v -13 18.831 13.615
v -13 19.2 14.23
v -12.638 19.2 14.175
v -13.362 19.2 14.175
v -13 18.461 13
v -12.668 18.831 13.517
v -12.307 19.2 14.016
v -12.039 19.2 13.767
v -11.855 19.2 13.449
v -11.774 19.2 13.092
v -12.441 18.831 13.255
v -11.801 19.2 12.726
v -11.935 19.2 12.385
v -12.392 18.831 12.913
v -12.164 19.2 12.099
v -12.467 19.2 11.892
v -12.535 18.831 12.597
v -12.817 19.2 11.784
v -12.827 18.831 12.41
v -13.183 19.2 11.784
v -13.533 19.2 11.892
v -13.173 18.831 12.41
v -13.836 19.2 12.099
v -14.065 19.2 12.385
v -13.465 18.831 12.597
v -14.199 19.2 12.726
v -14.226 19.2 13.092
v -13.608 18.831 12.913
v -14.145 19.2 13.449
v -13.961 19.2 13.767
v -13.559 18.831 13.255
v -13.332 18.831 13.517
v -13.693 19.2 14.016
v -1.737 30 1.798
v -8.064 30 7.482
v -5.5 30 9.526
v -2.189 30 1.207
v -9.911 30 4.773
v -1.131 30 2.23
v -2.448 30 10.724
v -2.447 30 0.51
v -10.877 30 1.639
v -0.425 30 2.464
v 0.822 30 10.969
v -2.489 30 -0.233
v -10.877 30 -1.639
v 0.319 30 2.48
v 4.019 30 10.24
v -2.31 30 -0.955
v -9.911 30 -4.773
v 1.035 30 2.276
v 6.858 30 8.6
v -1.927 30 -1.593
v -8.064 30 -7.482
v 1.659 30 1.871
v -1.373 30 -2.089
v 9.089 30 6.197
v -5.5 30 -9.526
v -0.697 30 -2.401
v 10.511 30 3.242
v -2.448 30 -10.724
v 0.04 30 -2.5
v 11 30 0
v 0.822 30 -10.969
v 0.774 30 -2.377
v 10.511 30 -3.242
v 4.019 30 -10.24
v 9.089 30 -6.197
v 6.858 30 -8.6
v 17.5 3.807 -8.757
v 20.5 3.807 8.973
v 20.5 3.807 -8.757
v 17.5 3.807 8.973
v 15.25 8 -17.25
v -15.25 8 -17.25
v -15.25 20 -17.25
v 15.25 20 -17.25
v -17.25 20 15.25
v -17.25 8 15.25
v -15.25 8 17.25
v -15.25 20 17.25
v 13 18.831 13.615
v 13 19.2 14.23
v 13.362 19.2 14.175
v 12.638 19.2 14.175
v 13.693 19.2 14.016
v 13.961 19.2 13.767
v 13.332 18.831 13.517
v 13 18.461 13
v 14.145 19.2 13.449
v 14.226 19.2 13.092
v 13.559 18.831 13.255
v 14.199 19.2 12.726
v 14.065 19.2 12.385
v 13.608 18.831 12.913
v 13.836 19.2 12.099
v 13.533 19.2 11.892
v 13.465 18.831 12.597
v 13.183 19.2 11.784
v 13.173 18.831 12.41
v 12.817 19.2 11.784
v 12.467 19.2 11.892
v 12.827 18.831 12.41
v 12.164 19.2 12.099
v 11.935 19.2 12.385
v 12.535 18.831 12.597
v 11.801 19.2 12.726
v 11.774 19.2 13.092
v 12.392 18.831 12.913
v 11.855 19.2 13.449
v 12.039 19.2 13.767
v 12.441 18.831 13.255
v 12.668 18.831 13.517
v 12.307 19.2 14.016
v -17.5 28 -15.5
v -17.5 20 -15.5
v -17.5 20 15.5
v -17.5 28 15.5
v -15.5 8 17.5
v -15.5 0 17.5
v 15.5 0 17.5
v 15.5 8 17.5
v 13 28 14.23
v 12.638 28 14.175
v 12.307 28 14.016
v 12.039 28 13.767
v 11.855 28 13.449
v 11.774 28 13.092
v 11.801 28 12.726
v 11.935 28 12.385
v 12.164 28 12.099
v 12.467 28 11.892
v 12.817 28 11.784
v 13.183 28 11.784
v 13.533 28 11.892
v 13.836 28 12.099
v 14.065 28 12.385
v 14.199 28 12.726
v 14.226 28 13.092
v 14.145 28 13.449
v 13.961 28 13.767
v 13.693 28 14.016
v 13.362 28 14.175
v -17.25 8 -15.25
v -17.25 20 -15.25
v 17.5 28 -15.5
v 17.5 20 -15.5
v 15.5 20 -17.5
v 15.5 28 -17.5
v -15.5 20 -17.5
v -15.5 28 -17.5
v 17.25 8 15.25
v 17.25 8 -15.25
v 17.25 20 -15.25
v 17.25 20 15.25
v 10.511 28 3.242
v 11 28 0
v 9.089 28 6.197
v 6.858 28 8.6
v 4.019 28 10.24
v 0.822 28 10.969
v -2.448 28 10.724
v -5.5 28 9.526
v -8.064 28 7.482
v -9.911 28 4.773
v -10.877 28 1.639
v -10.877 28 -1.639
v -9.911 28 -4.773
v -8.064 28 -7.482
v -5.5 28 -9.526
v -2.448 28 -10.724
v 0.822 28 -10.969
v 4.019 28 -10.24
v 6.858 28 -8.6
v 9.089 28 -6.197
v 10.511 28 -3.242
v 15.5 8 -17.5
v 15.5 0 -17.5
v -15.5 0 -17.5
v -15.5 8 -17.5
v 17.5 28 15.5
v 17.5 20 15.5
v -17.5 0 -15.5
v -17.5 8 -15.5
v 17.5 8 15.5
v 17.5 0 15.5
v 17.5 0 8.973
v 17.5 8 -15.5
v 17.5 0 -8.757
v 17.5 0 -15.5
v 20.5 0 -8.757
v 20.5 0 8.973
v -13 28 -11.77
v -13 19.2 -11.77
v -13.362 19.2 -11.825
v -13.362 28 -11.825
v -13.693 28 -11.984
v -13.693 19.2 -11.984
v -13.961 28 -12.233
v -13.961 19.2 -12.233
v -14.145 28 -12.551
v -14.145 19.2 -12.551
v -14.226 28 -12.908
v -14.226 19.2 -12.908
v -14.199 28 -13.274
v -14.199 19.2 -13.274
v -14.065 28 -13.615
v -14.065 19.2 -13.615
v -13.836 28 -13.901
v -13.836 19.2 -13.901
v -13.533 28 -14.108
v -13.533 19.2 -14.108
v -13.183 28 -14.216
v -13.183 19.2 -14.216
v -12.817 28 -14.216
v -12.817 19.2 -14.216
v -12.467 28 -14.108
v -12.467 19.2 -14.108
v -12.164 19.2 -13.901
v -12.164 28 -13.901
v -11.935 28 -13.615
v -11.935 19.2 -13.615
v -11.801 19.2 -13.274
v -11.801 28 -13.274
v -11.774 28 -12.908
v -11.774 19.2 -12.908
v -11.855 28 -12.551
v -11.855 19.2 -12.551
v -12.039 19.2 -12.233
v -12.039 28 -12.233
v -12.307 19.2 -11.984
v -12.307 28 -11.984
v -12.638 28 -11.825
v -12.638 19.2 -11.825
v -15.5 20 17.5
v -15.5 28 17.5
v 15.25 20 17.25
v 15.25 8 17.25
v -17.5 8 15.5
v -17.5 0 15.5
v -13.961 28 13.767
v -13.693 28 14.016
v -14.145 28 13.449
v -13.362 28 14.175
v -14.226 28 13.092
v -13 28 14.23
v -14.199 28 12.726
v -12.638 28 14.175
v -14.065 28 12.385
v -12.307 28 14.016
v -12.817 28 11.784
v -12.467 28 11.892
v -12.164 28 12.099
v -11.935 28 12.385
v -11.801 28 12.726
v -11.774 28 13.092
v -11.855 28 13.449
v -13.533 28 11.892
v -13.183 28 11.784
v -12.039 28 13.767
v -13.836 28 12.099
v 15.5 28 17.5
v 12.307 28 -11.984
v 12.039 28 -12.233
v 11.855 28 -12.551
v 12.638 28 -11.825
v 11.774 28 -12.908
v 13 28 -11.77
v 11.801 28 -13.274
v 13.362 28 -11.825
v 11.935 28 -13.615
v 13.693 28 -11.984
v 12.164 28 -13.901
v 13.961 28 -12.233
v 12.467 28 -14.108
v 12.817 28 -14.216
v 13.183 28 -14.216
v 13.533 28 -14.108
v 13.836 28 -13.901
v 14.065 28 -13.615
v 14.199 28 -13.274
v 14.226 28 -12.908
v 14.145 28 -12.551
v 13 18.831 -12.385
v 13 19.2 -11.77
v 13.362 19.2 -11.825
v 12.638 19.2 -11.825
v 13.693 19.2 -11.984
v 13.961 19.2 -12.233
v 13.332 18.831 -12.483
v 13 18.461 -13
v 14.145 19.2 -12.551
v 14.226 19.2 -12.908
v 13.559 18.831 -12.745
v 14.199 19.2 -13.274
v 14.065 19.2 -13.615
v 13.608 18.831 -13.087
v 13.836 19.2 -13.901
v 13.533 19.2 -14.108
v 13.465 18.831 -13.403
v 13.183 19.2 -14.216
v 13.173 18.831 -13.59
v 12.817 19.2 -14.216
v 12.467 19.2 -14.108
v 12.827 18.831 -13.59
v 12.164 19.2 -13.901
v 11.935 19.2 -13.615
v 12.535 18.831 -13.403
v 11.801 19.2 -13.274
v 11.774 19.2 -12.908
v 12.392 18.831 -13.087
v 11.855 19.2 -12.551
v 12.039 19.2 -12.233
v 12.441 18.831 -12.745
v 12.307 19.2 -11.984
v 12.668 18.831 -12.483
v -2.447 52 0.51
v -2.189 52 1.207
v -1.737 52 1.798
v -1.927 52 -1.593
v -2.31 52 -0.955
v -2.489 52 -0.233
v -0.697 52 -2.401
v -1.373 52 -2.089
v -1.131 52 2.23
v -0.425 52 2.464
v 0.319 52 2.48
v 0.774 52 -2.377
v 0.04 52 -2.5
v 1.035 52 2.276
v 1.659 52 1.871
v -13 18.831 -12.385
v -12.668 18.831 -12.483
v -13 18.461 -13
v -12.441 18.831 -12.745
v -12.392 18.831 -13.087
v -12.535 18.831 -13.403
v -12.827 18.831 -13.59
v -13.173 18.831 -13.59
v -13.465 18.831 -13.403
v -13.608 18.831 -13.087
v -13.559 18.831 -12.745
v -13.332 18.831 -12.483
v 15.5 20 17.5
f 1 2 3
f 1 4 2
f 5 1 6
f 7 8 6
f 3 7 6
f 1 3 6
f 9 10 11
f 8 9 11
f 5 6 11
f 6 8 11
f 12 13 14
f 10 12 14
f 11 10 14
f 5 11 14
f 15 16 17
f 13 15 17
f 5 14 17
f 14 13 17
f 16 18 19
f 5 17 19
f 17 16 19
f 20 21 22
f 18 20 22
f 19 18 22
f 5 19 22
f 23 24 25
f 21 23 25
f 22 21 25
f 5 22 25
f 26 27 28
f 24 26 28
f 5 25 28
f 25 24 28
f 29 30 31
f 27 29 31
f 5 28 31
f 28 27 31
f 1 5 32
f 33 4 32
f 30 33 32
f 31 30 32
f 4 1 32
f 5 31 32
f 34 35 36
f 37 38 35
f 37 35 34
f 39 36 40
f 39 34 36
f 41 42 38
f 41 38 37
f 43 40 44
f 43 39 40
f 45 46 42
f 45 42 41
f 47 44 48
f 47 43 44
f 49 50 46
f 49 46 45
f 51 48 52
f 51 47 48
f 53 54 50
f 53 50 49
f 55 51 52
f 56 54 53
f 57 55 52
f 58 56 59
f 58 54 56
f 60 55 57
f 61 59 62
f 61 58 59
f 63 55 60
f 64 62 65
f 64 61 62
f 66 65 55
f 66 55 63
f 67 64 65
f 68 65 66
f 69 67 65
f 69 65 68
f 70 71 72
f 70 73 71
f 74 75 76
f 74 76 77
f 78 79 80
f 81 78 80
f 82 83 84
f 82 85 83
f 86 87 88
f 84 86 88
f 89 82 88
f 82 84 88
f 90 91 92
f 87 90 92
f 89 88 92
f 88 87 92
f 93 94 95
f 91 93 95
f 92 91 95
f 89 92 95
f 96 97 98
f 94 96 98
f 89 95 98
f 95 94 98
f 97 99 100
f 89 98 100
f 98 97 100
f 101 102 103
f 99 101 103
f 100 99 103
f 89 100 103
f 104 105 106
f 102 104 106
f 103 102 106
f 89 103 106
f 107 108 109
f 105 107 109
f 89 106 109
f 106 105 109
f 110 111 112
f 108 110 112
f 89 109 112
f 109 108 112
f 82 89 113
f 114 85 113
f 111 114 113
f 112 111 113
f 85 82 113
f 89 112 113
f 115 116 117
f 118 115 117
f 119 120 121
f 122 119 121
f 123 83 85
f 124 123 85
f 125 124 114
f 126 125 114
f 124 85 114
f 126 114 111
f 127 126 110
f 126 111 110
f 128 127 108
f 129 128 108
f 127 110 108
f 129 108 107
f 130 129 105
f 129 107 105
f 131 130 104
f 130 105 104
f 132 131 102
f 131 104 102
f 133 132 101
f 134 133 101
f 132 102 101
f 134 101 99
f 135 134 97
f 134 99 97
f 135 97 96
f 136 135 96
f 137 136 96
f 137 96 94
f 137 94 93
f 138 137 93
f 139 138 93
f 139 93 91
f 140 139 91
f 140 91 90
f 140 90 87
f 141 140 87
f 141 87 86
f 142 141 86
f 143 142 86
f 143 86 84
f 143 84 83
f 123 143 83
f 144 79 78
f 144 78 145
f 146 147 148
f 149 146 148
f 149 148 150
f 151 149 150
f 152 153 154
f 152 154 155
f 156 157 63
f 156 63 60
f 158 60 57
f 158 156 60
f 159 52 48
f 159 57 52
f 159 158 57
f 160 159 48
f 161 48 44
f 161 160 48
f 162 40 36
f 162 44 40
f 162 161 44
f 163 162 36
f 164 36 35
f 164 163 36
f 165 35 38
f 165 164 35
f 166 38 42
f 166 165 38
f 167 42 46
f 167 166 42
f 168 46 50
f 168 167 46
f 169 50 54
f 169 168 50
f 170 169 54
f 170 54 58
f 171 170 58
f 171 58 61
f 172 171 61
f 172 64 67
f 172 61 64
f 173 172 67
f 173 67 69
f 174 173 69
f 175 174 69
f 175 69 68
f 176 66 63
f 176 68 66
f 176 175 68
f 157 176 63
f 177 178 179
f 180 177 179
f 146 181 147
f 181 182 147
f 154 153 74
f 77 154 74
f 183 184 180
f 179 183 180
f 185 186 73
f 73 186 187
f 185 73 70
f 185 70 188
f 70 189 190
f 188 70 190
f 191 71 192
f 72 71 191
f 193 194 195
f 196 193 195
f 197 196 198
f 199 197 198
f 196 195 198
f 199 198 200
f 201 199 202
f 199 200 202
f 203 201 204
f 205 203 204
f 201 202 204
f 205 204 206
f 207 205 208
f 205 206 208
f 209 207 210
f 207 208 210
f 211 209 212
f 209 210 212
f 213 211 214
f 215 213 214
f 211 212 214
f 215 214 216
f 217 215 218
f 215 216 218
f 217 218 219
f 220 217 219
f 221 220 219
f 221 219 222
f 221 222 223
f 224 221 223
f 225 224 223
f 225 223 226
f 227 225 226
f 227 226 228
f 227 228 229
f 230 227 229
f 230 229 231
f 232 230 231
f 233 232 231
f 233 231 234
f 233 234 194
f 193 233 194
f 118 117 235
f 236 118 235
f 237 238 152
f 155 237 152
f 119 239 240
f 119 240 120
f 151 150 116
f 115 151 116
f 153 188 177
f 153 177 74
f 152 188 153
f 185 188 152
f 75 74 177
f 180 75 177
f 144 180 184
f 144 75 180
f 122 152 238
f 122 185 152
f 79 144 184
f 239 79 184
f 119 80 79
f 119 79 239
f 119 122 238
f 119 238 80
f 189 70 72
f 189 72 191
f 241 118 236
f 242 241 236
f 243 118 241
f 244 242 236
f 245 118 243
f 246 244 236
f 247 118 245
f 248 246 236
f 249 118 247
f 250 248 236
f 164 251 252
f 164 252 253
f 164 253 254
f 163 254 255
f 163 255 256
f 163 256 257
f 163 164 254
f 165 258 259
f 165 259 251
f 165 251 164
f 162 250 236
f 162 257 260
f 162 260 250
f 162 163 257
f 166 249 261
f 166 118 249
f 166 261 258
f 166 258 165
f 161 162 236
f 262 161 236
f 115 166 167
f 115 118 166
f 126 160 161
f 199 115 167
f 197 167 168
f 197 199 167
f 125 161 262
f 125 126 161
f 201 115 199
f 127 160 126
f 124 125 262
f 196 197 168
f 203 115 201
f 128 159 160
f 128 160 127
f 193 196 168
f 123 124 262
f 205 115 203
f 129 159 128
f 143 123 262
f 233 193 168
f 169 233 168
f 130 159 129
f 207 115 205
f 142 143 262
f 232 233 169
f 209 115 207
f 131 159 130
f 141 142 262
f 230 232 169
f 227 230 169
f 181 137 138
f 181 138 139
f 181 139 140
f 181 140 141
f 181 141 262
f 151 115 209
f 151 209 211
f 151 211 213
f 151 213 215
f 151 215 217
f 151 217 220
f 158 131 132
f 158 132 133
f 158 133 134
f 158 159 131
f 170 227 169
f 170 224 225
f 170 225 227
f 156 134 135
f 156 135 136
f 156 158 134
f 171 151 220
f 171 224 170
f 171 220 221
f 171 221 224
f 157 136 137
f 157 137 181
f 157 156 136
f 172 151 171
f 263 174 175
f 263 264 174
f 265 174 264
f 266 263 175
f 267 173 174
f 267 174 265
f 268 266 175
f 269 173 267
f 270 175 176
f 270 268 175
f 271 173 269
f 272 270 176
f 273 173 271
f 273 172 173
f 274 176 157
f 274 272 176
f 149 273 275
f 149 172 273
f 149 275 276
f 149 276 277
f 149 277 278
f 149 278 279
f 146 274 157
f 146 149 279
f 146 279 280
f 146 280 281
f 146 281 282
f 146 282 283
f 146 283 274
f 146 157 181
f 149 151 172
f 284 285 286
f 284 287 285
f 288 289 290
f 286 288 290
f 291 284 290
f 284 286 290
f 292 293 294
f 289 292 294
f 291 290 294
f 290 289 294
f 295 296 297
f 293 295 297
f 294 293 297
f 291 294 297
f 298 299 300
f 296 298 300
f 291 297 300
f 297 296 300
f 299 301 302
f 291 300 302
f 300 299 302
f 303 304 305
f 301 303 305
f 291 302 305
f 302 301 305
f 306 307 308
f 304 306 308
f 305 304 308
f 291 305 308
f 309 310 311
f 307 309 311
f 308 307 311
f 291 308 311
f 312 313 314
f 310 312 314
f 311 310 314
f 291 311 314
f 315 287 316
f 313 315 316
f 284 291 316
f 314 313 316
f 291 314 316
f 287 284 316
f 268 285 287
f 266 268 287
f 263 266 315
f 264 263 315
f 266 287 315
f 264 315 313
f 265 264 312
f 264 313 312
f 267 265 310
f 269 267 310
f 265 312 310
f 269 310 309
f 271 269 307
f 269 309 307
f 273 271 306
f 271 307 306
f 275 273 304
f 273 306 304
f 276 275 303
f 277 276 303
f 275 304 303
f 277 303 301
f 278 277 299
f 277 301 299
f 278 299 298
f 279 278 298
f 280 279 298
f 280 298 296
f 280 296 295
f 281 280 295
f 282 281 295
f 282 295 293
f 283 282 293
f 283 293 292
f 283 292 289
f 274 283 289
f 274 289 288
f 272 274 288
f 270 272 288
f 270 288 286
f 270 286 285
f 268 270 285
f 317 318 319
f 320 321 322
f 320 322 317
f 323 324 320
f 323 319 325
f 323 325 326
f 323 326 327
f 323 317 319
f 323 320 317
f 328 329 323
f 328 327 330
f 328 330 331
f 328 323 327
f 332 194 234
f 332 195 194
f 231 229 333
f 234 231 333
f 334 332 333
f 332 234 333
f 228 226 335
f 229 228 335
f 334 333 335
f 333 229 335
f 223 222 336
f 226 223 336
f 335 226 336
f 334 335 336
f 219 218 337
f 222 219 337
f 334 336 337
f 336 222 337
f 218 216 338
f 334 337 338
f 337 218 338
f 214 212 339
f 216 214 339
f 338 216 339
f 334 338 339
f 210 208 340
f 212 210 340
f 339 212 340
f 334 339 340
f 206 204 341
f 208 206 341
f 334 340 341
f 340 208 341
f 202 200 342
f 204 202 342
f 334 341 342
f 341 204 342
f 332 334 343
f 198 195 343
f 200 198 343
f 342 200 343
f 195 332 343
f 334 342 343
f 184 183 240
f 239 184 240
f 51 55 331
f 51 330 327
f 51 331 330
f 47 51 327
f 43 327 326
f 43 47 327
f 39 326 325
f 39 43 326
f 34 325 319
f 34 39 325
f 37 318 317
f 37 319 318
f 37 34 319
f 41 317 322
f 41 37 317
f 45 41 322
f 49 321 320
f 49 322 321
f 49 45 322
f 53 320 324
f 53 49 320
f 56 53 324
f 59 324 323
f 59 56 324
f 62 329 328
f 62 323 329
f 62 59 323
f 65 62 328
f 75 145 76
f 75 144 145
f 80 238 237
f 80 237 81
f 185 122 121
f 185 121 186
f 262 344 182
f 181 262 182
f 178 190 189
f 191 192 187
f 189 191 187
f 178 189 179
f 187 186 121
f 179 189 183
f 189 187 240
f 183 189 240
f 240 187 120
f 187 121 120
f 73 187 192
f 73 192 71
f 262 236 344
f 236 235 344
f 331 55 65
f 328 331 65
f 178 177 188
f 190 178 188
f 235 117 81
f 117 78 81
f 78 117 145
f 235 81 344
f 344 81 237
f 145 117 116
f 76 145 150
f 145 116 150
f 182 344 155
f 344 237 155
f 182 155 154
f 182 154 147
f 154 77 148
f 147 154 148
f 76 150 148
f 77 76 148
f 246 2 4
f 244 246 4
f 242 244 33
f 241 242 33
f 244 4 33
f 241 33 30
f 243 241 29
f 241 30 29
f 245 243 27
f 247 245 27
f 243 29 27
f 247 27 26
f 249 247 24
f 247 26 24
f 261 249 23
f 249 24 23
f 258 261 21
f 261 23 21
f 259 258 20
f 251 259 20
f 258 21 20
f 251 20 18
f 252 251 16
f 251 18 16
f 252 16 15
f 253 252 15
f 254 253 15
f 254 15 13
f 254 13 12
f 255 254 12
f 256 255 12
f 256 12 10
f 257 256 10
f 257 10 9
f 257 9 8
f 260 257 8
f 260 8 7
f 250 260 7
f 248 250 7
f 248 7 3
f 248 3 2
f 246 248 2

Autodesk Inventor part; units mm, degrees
ref_plane "YZ Plane" through (0, 0, 0) normal (1, 0, 0) x (0, 1, 0)
ref_plane "XZ Plane" through (0, 0, 0) normal (0, 1, 0) x (-1, 0, 0)
ref_plane "XY Plane" through (0, 0, 0) normal (0, 0, 1) x (1, 0, 0)
sketch "Sketch1" plane through (0, 0, 0) normal (0, 1, 0) x (-1, 0, 0)
  line L0 (-15.5, -17.5) -> (15.5, -17.5)
  line L1 (17.5, -15.5) -> (17.5, 15.5)
  line L2 (15.5, 17.5) -> (-15.5, 17.5)
  line L3 (-17.5, 15.5) -> (-17.5, -15.5)
  line L4 (-17.5, -17.5) -> (17.5, 17.5) construction
  line L5 (17.5, -17.5) -> (-17.5, 17.5) construction
  line L6 (17.5, 15.5) -> (15.5, 17.5)
  line L7 (17.5, -15.5) -> (15.5, -17.5)
  line L8 (-15.5, -17.5) -> (-17.5, -15.5)
  line L9 (-15.5, 17.5) -> (-17.5, 15.5)
  point P0 (0, 0)
  dimension "d0" = 35
  dimension "d1" = 35
  dimension "d2" = 2
  dimension "d3" = 2
  dimension "d4" = 2
  dimension "d5" = 2
  dimension "d6" = 2
  dimension "d7" = 2
  dimension "d8" = 2
  dimension "d9" = 2
extrude "Extrusion1" add sketch "Sketch1" along normal blind 8
sketch "Sketch2" plane through (0, 8, 0) normal (0, 1, 0) x (1, 0, 0)
  line L0 (-17.5, -15.5) -> (-15.5, -17.5) projected
  line L1 (-15.5, -17.5) -> (15.5, -17.5) projected
  line L2 (15.5, -17.5) -> (17.5, -15.5) projected
  line L3 (17.5, -15.5) -> (17.5, 15.5) projected
  line L4 (17.5, 15.5) -> (15.5, 17.5) projected
  line L5 (15.5, 17.5) -> (-15.5, 17.5) projected
  line L6 (-15.5, 17.5) -> (-17.5, 15.5) projected
  line L7 (-17.5, 15.5) -> (-17.5, -15.5) projected
  line L8 (15.25, -17.25) -> (-15.25, -17.25)
  line L9 (-17.25, -15.25) -> (-17.25, 15.25)
  line L10 (-15.25, 17.25) -> (15.25, 17.25)
  line L11 (17.25, 15.25) -> (17.25, -15.25)
  line L12 (17.25, -17.25) -> (-17.25, 17.25) construction
  line L13 (-17.25, -17.25) -> (17.25, 17.25) construction
  line L14 (-17.25, 15.25) -> (-15.25, 17.25)
  line L15 (-17.25, -15.25) -> (-15.25, -17.25)
  line L16 (15.25, -17.25) -> (17.25, -15.25)
  line L17 (17.25, 15.25) -> (15.25, 17.25)
  point P0 (0, 0)
  dimension "d12" = 34.5
  dimension "d13" = 34.5
  dimension "d14" = 2
  dimension "d15" = 2
  dimension "d16" = 2
  dimension "d17" = 2
  dimension "d18" = 2
  dimension "d19" = 2
  dimension "d20" = 2
  dimension "d21" = 2
extrude "Extrusion2" add sketch "Sketch2" along normal blind 12 contours L8 L15 L9 L14 L10 L17 L11 L16
sketch "Sketch3" plane through (0, 20, 0) normal (0, 1, 0) x (1, 0, 0)
  line L0 (-17.5, -15.5) -> (-15.5, -17.5) projected
  line L1 (-17.5, 15.5) -> (-17.5, -15.5) projected
  line L2 (-15.5, 17.5) -> (-17.5, 15.5) projected
  line L3 (15.5, 17.5) -> (-15.5, 17.5) projected
  line L4 (17.5, 15.5) -> (15.5, 17.5) projected
  line L5 (17.5, -15.5) -> (17.5, 15.5) projected
  line L6 (15.5, -17.5) -> (17.5, -15.5) projected
  line L7 (-15.5, -17.5) -> (15.5, -17.5) projected
  point P0 (0, 0)
extrude "Extrusion3" add sketch "Sketch3" along normal blind 8
sketch "Sketch4" plane through (0, 28, 0) normal (0, 1, 0) x (1, 0, 0)
  circle A0 centre (0, 0) radius 11
  dimension "d26" = 22
extrude "Extrusion4" add sketch "Sketch4" along normal blind 2
sketch "Sketch5" plane through (0, 30, 0) normal (0, 1, 0) x (1, 0, 0)
  arc A0 (0.7737, 2.3773) -> (1.6586, -1.8706) centre (0, 0) ccw
  line L0 (1.6586, -1.8706) -> (0.7737, 2.3773)
  dimension "d29" = 5
extrude "Extrusion5" add sketch "Sketch5" along normal blind 22
sketch "Sketch6" plane through (0, 28, 0) normal (0, 1, 0) x (1, 0, 0)
  line L0 (15.5, 17.5) -> (-15.5, 17.5) projected
  line L1 (-17.5, 15.5) -> (-17.5, -15.5) projected
  line L2 (17.5, -15.5) -> (17.5, 15.5) projected
  line L3 (-15.5, -17.5) -> (15.5, -17.5) projected
  point P0 (0, 0)
  point P1 (-13, -13)
  point P2 (-13, 13)
  point P3 (13, 13)
  point P4 (13, -13)
  dimension "d32" = 26
  dimension "d33" = 26
  dimension "d34" = 4.5
  dimension "d35" = 4.5
  dimension "d45" = 4.5
  dimension "d46" = 4.5
  dimension "d47" = 4.5
  dimension "d48" = 4.5
  dimension "d49" = 4.5
hole "Hole1" at (-13, 28, 13) at (-13, 28, -13) at (13, 28, -13) at (13, 28, 13) direction (0, -1, 0) diameter 2.459 depth 8.8 tip angle 118 thread size "M3x0.5" class "6H" standard "ISO Metric profile"
sketch "Sketch7" plane through (17.5, 0, 15.5) normal (1, 0, 0) x (0, 0, -1)
  line L0 (31, 0) -> (0, 0) projected
  line L1 (24.2568, 0) -> (6.5267, 0)
  line L2 (6.5267, 0) -> (6.5267, 3.8069)
  line L3 (6.5267, 3.8069) -> (24.2568, 3.8069)
  line L4 (24.2568, 3.8069) -> (24.2568, 0)
  point P0 (15.5, 0)
  point P1 (6.5267, 0)
extrude "Extrusion6" add sketch "Sketch7" along normal blind 3
equation "\"d3\" = d2"
equation "\"d4\" = d2"
equation "\"d5\" = d4"
equation "\"d6\" = d2"
equation "\"d7\" = d6"
equation "\"d8\" = d2"
equation "\"d9\" = d8"
equation "\"d15\" = d14"
equation "\"d16\" = d14"
equation "\"d17\" = d16"
equation "\"d18\" = d14"
equation "\"d19\" = d18"
equation "\"d20\" = d14"
equation "\"d21\" = d20"
properties part number "stepper"
